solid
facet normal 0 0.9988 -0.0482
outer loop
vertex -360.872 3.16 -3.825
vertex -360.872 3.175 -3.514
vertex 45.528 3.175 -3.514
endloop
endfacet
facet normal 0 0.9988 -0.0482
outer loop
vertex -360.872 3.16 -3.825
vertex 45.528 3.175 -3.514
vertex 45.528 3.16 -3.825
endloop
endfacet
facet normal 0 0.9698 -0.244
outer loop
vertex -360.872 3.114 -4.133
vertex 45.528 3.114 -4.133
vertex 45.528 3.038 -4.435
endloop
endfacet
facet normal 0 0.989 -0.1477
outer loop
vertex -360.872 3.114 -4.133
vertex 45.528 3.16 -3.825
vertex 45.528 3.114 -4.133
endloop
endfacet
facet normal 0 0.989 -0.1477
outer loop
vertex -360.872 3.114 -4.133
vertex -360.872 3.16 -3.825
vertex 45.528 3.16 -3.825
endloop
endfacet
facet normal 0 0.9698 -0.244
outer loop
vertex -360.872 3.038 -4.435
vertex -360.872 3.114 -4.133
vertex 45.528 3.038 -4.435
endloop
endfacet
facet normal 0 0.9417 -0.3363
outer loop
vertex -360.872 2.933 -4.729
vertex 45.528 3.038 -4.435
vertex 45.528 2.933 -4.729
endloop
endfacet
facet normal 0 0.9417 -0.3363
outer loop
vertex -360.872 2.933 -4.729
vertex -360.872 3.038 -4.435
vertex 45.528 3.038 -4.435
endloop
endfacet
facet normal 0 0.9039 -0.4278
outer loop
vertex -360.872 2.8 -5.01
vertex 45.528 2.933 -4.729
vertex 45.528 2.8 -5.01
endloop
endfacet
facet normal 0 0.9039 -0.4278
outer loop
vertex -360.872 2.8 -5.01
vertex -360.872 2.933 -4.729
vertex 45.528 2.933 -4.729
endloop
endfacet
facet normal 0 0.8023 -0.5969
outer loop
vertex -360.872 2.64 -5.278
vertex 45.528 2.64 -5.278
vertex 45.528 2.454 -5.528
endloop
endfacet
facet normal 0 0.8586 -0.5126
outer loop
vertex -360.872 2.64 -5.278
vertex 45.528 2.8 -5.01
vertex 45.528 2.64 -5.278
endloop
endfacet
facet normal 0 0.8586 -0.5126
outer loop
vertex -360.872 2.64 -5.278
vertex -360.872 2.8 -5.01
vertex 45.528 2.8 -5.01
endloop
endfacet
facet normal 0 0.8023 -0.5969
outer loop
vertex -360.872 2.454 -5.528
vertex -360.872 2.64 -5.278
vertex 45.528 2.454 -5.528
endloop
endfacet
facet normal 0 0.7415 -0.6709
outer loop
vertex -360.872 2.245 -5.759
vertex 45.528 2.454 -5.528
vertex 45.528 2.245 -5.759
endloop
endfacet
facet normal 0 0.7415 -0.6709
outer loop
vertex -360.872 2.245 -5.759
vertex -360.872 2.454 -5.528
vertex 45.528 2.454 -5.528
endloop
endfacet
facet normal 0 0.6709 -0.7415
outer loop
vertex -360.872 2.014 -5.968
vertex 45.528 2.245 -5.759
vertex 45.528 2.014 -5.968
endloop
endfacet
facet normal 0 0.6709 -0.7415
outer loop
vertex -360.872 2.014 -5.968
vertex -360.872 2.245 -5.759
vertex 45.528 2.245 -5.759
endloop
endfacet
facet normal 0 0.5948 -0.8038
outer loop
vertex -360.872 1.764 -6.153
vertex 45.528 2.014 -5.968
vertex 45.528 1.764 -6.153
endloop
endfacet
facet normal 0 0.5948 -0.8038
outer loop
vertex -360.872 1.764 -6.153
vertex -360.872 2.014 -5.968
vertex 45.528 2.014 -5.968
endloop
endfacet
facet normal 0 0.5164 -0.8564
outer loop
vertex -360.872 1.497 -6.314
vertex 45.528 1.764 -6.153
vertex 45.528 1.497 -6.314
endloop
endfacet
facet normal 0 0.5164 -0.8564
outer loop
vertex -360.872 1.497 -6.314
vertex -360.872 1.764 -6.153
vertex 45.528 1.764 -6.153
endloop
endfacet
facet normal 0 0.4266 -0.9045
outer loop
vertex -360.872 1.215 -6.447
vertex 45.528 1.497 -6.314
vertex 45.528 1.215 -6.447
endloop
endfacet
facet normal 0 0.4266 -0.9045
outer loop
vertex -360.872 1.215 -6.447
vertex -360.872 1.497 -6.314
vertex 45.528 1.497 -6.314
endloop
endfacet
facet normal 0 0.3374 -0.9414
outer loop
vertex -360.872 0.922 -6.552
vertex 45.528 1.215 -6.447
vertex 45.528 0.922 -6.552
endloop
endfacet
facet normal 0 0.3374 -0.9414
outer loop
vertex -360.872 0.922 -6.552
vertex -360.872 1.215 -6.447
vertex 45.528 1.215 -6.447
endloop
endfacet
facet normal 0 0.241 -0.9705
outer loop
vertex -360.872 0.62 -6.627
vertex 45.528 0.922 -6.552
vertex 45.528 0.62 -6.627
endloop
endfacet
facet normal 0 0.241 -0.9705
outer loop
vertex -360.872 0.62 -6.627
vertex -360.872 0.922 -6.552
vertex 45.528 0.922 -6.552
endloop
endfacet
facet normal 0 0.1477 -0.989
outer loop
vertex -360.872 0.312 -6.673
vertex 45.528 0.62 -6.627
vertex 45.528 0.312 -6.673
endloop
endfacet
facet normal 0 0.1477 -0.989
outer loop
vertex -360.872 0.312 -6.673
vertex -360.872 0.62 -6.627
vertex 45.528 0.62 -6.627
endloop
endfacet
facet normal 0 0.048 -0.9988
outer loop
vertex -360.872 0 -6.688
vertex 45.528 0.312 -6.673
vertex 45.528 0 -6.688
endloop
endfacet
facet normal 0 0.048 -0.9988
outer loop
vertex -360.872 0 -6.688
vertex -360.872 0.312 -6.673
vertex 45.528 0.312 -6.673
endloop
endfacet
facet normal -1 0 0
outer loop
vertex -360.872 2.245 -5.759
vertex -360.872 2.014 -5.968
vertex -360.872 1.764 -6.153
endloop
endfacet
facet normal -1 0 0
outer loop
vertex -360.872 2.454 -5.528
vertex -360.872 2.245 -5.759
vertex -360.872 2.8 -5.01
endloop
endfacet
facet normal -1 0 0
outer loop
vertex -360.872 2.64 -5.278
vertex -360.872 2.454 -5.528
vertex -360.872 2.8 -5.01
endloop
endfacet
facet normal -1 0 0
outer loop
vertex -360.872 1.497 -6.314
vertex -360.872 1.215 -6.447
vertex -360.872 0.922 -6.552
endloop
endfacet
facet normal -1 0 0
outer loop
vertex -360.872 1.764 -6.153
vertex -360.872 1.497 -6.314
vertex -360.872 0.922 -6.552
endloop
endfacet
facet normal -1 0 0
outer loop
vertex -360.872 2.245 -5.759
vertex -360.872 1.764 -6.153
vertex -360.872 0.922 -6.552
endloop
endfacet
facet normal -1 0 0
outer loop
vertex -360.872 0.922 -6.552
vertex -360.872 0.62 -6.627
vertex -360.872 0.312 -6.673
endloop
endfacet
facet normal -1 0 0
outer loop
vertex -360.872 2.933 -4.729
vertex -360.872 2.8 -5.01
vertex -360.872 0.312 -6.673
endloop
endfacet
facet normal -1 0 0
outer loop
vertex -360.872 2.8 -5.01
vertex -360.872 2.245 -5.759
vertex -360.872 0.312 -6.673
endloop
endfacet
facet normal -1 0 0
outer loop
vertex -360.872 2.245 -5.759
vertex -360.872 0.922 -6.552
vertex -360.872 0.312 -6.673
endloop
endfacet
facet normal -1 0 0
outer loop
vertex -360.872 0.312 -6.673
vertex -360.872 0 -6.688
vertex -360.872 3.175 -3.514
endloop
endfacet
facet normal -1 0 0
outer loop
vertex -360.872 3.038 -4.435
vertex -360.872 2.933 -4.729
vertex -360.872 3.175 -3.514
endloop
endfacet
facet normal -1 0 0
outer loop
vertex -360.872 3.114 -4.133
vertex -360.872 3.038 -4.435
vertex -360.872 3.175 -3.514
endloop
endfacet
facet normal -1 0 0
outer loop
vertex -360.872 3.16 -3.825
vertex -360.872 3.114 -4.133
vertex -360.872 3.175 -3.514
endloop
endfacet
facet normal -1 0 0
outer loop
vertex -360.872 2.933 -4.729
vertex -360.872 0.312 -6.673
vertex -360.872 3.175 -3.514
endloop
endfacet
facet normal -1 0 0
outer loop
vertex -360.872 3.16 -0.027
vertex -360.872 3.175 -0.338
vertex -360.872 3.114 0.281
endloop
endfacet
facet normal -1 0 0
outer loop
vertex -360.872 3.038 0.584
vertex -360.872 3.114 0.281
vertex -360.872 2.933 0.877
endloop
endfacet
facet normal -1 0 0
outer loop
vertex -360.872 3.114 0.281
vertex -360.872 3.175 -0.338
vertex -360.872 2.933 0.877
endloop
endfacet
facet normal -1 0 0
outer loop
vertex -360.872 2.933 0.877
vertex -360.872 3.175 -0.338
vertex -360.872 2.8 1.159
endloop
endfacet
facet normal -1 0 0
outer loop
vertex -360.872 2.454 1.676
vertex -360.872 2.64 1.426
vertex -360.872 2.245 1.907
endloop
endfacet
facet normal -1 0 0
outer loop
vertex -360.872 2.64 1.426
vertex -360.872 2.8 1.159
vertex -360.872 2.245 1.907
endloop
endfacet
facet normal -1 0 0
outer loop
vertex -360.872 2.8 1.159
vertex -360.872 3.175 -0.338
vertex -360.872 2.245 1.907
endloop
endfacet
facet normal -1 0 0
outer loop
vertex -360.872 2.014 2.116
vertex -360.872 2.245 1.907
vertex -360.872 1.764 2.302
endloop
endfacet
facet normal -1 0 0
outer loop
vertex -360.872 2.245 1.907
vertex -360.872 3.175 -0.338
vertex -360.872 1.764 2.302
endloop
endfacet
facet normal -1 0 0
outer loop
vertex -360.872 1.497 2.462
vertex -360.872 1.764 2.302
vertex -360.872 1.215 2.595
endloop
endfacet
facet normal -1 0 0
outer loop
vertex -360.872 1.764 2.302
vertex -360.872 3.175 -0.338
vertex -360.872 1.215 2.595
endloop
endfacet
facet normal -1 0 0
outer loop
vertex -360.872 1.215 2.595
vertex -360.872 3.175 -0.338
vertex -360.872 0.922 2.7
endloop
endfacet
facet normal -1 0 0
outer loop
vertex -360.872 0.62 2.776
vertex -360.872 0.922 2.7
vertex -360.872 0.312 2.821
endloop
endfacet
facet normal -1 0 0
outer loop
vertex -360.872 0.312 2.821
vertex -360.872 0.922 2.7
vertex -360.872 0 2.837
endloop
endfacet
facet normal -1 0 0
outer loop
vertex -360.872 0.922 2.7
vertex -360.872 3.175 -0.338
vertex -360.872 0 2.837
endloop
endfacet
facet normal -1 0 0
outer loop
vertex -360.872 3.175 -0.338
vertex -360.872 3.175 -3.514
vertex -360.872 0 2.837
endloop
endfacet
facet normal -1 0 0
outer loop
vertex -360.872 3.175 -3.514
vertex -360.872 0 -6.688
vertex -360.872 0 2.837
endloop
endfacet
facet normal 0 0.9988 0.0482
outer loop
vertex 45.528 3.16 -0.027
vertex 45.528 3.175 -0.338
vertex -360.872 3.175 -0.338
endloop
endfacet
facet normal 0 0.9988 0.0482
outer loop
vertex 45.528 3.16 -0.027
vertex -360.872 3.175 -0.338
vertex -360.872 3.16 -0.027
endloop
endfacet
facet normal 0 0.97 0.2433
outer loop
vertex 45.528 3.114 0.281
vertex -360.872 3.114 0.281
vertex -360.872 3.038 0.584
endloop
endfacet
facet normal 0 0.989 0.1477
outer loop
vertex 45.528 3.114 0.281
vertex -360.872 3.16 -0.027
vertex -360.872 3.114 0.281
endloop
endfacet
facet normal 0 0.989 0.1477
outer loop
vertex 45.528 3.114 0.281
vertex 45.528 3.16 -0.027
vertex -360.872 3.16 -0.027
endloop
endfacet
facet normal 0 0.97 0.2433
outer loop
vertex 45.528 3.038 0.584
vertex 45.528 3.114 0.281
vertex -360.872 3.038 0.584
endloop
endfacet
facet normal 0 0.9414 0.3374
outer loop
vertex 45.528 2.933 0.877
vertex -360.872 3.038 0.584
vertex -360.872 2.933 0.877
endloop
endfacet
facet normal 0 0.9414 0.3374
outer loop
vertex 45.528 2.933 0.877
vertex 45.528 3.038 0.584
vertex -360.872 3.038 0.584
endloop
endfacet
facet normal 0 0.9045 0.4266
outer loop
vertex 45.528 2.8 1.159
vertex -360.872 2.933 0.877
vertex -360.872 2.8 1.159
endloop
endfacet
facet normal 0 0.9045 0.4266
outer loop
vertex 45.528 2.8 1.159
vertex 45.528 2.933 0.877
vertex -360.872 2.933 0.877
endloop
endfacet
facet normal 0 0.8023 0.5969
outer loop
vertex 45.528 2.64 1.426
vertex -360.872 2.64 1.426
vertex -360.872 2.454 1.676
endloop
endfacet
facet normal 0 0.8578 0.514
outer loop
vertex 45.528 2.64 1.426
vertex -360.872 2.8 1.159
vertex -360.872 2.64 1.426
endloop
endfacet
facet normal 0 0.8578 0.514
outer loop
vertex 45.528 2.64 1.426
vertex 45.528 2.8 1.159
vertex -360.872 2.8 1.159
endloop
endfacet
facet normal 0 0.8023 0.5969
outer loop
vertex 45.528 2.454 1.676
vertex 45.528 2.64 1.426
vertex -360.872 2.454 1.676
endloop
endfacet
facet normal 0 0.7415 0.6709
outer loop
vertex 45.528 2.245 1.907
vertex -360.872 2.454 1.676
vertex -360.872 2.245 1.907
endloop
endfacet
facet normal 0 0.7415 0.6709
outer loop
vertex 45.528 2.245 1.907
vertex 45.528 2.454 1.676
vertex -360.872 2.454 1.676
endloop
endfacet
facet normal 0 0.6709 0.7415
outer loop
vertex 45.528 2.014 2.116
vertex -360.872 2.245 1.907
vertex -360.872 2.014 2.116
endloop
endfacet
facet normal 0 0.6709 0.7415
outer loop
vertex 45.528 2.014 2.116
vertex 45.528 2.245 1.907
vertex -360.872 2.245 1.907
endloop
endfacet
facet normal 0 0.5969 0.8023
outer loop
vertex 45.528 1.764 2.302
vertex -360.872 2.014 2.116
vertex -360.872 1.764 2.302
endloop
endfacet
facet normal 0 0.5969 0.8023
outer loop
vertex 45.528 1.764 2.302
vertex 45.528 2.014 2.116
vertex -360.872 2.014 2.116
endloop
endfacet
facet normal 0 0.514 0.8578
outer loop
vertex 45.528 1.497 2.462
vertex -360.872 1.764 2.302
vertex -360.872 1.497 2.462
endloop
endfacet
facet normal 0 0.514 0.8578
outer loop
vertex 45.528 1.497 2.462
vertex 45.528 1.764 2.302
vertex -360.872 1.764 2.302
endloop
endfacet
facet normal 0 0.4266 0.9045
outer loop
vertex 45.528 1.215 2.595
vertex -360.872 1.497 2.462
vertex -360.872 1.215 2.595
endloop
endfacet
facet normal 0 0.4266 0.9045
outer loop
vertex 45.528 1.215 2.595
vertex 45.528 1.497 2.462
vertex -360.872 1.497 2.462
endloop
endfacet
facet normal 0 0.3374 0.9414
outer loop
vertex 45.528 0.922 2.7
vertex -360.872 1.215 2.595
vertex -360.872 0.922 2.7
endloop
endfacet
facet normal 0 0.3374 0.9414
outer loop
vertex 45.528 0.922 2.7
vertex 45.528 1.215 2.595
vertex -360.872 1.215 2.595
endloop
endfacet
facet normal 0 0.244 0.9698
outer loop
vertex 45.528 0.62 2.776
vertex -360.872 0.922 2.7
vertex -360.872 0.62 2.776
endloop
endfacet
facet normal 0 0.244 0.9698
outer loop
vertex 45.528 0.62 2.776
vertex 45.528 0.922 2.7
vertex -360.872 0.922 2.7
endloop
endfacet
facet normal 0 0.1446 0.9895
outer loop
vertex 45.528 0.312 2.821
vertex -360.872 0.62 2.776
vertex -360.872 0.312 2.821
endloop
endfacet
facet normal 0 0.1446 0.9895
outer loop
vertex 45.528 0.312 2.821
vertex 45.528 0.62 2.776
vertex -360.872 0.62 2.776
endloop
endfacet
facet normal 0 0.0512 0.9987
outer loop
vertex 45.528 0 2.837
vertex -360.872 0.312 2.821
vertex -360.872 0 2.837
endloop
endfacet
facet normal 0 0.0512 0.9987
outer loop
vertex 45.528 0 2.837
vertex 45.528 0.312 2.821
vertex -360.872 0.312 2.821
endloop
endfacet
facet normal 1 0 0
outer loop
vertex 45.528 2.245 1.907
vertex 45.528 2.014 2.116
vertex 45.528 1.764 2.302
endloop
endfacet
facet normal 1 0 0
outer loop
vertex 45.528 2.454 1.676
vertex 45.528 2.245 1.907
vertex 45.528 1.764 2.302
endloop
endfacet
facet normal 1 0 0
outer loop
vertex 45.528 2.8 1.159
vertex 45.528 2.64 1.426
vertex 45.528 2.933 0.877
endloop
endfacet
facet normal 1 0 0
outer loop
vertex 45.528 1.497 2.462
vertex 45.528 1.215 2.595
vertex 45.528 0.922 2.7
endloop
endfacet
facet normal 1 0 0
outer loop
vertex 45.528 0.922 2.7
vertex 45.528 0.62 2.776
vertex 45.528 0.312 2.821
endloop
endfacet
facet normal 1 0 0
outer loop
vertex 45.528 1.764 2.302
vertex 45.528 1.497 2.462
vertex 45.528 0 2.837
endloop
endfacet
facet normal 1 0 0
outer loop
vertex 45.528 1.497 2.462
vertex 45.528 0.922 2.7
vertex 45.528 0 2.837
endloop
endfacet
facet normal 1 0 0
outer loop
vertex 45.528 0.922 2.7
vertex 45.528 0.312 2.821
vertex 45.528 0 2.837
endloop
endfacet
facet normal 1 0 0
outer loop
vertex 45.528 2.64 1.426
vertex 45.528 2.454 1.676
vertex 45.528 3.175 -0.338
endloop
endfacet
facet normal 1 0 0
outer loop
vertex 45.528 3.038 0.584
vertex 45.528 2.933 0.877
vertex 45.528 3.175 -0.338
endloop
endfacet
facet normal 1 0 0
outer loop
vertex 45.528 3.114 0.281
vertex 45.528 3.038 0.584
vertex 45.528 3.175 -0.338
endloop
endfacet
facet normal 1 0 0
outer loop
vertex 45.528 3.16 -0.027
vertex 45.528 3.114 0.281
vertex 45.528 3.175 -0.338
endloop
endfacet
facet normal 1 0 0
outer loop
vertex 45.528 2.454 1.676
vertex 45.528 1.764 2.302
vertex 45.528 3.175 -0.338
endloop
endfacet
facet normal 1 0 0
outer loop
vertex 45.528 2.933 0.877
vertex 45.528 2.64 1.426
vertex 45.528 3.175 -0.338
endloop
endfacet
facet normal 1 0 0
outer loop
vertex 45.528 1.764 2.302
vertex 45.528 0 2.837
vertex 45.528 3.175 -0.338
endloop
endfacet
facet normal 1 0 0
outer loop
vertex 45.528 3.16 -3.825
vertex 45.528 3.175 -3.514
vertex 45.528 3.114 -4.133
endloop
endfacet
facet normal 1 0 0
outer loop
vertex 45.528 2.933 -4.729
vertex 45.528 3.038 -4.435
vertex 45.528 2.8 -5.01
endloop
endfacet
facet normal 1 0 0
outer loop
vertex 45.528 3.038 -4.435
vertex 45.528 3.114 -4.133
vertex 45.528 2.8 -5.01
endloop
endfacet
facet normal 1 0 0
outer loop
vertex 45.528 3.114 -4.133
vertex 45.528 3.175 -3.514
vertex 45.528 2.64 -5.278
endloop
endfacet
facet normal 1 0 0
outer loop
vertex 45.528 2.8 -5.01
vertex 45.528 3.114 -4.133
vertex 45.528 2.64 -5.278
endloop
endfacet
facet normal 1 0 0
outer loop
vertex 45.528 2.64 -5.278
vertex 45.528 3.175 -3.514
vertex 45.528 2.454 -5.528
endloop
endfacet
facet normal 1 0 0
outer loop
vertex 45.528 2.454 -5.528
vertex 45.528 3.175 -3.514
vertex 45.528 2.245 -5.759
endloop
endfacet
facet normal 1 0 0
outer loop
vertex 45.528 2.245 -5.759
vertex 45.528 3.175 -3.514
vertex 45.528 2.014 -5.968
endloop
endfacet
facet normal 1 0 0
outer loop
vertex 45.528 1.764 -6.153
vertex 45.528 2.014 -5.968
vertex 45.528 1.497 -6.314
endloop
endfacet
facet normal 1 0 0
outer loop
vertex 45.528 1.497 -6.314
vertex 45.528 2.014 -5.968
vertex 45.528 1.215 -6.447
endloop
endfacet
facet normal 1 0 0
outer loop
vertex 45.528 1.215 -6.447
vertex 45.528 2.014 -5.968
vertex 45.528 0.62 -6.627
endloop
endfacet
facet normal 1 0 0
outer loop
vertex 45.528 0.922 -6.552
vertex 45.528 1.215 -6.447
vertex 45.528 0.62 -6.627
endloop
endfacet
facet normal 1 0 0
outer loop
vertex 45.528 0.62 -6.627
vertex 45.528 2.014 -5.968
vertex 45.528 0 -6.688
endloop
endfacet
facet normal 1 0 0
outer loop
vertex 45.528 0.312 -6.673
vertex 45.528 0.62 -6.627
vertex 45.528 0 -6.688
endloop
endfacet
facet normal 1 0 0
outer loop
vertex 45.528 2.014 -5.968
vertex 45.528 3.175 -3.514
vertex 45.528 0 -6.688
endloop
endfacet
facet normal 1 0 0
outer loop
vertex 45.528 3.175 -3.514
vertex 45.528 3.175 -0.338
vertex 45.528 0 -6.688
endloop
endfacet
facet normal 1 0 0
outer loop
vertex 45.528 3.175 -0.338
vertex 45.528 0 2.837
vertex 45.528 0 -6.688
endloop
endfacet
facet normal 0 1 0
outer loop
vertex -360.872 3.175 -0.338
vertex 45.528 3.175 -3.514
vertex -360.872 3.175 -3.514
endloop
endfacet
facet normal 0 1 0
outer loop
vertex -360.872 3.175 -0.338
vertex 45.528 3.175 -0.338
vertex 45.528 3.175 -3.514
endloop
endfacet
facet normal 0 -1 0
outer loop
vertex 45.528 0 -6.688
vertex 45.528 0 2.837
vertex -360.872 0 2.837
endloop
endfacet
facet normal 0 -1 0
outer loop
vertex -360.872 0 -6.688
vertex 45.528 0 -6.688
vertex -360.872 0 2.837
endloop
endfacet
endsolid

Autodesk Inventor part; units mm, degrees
ref_plane "YZ Plane" through (0, 0, 0) normal (1, 0, 0) x (0, 1, 0)
ref_plane "XZ Plane" through (0, 0, 0) normal (0, 1, 0) x (-1, 0, 0)
ref_plane "XY Plane" through (0, 0, 0) normal (0, 0, 1) x (1, 0, 0)
sketch "Sketch1" plane through (0, 0, 0) normal (0, 1, 0) x (-1, 0, 0)
  line L0 (360.8724, 2.8366) -> (-45.5276, 2.8366)
  line L1 (-45.5276, 2.8366) -> (-45.5276, -6.6884)
  line L2 (-45.5276, -6.6884) -> (360.8724, -6.6884)
  line L3 (360.8724, -6.6884) -> (360.8724, 2.8366)
  point P0 (0, 0)
  dimension "d0" = 406.4
  dimension "d1" = 9.525
extrude "Extrusion1" add sketch "Sketch1" along normal blind 3.175
fillet "Fillet1" radius 3.175 2 edges at (-157.6724, 3.175, 2.8366) (-157.6724, 3.175, -6.6884)
properties part number "LED light strip" material "Wood (Oak)"
